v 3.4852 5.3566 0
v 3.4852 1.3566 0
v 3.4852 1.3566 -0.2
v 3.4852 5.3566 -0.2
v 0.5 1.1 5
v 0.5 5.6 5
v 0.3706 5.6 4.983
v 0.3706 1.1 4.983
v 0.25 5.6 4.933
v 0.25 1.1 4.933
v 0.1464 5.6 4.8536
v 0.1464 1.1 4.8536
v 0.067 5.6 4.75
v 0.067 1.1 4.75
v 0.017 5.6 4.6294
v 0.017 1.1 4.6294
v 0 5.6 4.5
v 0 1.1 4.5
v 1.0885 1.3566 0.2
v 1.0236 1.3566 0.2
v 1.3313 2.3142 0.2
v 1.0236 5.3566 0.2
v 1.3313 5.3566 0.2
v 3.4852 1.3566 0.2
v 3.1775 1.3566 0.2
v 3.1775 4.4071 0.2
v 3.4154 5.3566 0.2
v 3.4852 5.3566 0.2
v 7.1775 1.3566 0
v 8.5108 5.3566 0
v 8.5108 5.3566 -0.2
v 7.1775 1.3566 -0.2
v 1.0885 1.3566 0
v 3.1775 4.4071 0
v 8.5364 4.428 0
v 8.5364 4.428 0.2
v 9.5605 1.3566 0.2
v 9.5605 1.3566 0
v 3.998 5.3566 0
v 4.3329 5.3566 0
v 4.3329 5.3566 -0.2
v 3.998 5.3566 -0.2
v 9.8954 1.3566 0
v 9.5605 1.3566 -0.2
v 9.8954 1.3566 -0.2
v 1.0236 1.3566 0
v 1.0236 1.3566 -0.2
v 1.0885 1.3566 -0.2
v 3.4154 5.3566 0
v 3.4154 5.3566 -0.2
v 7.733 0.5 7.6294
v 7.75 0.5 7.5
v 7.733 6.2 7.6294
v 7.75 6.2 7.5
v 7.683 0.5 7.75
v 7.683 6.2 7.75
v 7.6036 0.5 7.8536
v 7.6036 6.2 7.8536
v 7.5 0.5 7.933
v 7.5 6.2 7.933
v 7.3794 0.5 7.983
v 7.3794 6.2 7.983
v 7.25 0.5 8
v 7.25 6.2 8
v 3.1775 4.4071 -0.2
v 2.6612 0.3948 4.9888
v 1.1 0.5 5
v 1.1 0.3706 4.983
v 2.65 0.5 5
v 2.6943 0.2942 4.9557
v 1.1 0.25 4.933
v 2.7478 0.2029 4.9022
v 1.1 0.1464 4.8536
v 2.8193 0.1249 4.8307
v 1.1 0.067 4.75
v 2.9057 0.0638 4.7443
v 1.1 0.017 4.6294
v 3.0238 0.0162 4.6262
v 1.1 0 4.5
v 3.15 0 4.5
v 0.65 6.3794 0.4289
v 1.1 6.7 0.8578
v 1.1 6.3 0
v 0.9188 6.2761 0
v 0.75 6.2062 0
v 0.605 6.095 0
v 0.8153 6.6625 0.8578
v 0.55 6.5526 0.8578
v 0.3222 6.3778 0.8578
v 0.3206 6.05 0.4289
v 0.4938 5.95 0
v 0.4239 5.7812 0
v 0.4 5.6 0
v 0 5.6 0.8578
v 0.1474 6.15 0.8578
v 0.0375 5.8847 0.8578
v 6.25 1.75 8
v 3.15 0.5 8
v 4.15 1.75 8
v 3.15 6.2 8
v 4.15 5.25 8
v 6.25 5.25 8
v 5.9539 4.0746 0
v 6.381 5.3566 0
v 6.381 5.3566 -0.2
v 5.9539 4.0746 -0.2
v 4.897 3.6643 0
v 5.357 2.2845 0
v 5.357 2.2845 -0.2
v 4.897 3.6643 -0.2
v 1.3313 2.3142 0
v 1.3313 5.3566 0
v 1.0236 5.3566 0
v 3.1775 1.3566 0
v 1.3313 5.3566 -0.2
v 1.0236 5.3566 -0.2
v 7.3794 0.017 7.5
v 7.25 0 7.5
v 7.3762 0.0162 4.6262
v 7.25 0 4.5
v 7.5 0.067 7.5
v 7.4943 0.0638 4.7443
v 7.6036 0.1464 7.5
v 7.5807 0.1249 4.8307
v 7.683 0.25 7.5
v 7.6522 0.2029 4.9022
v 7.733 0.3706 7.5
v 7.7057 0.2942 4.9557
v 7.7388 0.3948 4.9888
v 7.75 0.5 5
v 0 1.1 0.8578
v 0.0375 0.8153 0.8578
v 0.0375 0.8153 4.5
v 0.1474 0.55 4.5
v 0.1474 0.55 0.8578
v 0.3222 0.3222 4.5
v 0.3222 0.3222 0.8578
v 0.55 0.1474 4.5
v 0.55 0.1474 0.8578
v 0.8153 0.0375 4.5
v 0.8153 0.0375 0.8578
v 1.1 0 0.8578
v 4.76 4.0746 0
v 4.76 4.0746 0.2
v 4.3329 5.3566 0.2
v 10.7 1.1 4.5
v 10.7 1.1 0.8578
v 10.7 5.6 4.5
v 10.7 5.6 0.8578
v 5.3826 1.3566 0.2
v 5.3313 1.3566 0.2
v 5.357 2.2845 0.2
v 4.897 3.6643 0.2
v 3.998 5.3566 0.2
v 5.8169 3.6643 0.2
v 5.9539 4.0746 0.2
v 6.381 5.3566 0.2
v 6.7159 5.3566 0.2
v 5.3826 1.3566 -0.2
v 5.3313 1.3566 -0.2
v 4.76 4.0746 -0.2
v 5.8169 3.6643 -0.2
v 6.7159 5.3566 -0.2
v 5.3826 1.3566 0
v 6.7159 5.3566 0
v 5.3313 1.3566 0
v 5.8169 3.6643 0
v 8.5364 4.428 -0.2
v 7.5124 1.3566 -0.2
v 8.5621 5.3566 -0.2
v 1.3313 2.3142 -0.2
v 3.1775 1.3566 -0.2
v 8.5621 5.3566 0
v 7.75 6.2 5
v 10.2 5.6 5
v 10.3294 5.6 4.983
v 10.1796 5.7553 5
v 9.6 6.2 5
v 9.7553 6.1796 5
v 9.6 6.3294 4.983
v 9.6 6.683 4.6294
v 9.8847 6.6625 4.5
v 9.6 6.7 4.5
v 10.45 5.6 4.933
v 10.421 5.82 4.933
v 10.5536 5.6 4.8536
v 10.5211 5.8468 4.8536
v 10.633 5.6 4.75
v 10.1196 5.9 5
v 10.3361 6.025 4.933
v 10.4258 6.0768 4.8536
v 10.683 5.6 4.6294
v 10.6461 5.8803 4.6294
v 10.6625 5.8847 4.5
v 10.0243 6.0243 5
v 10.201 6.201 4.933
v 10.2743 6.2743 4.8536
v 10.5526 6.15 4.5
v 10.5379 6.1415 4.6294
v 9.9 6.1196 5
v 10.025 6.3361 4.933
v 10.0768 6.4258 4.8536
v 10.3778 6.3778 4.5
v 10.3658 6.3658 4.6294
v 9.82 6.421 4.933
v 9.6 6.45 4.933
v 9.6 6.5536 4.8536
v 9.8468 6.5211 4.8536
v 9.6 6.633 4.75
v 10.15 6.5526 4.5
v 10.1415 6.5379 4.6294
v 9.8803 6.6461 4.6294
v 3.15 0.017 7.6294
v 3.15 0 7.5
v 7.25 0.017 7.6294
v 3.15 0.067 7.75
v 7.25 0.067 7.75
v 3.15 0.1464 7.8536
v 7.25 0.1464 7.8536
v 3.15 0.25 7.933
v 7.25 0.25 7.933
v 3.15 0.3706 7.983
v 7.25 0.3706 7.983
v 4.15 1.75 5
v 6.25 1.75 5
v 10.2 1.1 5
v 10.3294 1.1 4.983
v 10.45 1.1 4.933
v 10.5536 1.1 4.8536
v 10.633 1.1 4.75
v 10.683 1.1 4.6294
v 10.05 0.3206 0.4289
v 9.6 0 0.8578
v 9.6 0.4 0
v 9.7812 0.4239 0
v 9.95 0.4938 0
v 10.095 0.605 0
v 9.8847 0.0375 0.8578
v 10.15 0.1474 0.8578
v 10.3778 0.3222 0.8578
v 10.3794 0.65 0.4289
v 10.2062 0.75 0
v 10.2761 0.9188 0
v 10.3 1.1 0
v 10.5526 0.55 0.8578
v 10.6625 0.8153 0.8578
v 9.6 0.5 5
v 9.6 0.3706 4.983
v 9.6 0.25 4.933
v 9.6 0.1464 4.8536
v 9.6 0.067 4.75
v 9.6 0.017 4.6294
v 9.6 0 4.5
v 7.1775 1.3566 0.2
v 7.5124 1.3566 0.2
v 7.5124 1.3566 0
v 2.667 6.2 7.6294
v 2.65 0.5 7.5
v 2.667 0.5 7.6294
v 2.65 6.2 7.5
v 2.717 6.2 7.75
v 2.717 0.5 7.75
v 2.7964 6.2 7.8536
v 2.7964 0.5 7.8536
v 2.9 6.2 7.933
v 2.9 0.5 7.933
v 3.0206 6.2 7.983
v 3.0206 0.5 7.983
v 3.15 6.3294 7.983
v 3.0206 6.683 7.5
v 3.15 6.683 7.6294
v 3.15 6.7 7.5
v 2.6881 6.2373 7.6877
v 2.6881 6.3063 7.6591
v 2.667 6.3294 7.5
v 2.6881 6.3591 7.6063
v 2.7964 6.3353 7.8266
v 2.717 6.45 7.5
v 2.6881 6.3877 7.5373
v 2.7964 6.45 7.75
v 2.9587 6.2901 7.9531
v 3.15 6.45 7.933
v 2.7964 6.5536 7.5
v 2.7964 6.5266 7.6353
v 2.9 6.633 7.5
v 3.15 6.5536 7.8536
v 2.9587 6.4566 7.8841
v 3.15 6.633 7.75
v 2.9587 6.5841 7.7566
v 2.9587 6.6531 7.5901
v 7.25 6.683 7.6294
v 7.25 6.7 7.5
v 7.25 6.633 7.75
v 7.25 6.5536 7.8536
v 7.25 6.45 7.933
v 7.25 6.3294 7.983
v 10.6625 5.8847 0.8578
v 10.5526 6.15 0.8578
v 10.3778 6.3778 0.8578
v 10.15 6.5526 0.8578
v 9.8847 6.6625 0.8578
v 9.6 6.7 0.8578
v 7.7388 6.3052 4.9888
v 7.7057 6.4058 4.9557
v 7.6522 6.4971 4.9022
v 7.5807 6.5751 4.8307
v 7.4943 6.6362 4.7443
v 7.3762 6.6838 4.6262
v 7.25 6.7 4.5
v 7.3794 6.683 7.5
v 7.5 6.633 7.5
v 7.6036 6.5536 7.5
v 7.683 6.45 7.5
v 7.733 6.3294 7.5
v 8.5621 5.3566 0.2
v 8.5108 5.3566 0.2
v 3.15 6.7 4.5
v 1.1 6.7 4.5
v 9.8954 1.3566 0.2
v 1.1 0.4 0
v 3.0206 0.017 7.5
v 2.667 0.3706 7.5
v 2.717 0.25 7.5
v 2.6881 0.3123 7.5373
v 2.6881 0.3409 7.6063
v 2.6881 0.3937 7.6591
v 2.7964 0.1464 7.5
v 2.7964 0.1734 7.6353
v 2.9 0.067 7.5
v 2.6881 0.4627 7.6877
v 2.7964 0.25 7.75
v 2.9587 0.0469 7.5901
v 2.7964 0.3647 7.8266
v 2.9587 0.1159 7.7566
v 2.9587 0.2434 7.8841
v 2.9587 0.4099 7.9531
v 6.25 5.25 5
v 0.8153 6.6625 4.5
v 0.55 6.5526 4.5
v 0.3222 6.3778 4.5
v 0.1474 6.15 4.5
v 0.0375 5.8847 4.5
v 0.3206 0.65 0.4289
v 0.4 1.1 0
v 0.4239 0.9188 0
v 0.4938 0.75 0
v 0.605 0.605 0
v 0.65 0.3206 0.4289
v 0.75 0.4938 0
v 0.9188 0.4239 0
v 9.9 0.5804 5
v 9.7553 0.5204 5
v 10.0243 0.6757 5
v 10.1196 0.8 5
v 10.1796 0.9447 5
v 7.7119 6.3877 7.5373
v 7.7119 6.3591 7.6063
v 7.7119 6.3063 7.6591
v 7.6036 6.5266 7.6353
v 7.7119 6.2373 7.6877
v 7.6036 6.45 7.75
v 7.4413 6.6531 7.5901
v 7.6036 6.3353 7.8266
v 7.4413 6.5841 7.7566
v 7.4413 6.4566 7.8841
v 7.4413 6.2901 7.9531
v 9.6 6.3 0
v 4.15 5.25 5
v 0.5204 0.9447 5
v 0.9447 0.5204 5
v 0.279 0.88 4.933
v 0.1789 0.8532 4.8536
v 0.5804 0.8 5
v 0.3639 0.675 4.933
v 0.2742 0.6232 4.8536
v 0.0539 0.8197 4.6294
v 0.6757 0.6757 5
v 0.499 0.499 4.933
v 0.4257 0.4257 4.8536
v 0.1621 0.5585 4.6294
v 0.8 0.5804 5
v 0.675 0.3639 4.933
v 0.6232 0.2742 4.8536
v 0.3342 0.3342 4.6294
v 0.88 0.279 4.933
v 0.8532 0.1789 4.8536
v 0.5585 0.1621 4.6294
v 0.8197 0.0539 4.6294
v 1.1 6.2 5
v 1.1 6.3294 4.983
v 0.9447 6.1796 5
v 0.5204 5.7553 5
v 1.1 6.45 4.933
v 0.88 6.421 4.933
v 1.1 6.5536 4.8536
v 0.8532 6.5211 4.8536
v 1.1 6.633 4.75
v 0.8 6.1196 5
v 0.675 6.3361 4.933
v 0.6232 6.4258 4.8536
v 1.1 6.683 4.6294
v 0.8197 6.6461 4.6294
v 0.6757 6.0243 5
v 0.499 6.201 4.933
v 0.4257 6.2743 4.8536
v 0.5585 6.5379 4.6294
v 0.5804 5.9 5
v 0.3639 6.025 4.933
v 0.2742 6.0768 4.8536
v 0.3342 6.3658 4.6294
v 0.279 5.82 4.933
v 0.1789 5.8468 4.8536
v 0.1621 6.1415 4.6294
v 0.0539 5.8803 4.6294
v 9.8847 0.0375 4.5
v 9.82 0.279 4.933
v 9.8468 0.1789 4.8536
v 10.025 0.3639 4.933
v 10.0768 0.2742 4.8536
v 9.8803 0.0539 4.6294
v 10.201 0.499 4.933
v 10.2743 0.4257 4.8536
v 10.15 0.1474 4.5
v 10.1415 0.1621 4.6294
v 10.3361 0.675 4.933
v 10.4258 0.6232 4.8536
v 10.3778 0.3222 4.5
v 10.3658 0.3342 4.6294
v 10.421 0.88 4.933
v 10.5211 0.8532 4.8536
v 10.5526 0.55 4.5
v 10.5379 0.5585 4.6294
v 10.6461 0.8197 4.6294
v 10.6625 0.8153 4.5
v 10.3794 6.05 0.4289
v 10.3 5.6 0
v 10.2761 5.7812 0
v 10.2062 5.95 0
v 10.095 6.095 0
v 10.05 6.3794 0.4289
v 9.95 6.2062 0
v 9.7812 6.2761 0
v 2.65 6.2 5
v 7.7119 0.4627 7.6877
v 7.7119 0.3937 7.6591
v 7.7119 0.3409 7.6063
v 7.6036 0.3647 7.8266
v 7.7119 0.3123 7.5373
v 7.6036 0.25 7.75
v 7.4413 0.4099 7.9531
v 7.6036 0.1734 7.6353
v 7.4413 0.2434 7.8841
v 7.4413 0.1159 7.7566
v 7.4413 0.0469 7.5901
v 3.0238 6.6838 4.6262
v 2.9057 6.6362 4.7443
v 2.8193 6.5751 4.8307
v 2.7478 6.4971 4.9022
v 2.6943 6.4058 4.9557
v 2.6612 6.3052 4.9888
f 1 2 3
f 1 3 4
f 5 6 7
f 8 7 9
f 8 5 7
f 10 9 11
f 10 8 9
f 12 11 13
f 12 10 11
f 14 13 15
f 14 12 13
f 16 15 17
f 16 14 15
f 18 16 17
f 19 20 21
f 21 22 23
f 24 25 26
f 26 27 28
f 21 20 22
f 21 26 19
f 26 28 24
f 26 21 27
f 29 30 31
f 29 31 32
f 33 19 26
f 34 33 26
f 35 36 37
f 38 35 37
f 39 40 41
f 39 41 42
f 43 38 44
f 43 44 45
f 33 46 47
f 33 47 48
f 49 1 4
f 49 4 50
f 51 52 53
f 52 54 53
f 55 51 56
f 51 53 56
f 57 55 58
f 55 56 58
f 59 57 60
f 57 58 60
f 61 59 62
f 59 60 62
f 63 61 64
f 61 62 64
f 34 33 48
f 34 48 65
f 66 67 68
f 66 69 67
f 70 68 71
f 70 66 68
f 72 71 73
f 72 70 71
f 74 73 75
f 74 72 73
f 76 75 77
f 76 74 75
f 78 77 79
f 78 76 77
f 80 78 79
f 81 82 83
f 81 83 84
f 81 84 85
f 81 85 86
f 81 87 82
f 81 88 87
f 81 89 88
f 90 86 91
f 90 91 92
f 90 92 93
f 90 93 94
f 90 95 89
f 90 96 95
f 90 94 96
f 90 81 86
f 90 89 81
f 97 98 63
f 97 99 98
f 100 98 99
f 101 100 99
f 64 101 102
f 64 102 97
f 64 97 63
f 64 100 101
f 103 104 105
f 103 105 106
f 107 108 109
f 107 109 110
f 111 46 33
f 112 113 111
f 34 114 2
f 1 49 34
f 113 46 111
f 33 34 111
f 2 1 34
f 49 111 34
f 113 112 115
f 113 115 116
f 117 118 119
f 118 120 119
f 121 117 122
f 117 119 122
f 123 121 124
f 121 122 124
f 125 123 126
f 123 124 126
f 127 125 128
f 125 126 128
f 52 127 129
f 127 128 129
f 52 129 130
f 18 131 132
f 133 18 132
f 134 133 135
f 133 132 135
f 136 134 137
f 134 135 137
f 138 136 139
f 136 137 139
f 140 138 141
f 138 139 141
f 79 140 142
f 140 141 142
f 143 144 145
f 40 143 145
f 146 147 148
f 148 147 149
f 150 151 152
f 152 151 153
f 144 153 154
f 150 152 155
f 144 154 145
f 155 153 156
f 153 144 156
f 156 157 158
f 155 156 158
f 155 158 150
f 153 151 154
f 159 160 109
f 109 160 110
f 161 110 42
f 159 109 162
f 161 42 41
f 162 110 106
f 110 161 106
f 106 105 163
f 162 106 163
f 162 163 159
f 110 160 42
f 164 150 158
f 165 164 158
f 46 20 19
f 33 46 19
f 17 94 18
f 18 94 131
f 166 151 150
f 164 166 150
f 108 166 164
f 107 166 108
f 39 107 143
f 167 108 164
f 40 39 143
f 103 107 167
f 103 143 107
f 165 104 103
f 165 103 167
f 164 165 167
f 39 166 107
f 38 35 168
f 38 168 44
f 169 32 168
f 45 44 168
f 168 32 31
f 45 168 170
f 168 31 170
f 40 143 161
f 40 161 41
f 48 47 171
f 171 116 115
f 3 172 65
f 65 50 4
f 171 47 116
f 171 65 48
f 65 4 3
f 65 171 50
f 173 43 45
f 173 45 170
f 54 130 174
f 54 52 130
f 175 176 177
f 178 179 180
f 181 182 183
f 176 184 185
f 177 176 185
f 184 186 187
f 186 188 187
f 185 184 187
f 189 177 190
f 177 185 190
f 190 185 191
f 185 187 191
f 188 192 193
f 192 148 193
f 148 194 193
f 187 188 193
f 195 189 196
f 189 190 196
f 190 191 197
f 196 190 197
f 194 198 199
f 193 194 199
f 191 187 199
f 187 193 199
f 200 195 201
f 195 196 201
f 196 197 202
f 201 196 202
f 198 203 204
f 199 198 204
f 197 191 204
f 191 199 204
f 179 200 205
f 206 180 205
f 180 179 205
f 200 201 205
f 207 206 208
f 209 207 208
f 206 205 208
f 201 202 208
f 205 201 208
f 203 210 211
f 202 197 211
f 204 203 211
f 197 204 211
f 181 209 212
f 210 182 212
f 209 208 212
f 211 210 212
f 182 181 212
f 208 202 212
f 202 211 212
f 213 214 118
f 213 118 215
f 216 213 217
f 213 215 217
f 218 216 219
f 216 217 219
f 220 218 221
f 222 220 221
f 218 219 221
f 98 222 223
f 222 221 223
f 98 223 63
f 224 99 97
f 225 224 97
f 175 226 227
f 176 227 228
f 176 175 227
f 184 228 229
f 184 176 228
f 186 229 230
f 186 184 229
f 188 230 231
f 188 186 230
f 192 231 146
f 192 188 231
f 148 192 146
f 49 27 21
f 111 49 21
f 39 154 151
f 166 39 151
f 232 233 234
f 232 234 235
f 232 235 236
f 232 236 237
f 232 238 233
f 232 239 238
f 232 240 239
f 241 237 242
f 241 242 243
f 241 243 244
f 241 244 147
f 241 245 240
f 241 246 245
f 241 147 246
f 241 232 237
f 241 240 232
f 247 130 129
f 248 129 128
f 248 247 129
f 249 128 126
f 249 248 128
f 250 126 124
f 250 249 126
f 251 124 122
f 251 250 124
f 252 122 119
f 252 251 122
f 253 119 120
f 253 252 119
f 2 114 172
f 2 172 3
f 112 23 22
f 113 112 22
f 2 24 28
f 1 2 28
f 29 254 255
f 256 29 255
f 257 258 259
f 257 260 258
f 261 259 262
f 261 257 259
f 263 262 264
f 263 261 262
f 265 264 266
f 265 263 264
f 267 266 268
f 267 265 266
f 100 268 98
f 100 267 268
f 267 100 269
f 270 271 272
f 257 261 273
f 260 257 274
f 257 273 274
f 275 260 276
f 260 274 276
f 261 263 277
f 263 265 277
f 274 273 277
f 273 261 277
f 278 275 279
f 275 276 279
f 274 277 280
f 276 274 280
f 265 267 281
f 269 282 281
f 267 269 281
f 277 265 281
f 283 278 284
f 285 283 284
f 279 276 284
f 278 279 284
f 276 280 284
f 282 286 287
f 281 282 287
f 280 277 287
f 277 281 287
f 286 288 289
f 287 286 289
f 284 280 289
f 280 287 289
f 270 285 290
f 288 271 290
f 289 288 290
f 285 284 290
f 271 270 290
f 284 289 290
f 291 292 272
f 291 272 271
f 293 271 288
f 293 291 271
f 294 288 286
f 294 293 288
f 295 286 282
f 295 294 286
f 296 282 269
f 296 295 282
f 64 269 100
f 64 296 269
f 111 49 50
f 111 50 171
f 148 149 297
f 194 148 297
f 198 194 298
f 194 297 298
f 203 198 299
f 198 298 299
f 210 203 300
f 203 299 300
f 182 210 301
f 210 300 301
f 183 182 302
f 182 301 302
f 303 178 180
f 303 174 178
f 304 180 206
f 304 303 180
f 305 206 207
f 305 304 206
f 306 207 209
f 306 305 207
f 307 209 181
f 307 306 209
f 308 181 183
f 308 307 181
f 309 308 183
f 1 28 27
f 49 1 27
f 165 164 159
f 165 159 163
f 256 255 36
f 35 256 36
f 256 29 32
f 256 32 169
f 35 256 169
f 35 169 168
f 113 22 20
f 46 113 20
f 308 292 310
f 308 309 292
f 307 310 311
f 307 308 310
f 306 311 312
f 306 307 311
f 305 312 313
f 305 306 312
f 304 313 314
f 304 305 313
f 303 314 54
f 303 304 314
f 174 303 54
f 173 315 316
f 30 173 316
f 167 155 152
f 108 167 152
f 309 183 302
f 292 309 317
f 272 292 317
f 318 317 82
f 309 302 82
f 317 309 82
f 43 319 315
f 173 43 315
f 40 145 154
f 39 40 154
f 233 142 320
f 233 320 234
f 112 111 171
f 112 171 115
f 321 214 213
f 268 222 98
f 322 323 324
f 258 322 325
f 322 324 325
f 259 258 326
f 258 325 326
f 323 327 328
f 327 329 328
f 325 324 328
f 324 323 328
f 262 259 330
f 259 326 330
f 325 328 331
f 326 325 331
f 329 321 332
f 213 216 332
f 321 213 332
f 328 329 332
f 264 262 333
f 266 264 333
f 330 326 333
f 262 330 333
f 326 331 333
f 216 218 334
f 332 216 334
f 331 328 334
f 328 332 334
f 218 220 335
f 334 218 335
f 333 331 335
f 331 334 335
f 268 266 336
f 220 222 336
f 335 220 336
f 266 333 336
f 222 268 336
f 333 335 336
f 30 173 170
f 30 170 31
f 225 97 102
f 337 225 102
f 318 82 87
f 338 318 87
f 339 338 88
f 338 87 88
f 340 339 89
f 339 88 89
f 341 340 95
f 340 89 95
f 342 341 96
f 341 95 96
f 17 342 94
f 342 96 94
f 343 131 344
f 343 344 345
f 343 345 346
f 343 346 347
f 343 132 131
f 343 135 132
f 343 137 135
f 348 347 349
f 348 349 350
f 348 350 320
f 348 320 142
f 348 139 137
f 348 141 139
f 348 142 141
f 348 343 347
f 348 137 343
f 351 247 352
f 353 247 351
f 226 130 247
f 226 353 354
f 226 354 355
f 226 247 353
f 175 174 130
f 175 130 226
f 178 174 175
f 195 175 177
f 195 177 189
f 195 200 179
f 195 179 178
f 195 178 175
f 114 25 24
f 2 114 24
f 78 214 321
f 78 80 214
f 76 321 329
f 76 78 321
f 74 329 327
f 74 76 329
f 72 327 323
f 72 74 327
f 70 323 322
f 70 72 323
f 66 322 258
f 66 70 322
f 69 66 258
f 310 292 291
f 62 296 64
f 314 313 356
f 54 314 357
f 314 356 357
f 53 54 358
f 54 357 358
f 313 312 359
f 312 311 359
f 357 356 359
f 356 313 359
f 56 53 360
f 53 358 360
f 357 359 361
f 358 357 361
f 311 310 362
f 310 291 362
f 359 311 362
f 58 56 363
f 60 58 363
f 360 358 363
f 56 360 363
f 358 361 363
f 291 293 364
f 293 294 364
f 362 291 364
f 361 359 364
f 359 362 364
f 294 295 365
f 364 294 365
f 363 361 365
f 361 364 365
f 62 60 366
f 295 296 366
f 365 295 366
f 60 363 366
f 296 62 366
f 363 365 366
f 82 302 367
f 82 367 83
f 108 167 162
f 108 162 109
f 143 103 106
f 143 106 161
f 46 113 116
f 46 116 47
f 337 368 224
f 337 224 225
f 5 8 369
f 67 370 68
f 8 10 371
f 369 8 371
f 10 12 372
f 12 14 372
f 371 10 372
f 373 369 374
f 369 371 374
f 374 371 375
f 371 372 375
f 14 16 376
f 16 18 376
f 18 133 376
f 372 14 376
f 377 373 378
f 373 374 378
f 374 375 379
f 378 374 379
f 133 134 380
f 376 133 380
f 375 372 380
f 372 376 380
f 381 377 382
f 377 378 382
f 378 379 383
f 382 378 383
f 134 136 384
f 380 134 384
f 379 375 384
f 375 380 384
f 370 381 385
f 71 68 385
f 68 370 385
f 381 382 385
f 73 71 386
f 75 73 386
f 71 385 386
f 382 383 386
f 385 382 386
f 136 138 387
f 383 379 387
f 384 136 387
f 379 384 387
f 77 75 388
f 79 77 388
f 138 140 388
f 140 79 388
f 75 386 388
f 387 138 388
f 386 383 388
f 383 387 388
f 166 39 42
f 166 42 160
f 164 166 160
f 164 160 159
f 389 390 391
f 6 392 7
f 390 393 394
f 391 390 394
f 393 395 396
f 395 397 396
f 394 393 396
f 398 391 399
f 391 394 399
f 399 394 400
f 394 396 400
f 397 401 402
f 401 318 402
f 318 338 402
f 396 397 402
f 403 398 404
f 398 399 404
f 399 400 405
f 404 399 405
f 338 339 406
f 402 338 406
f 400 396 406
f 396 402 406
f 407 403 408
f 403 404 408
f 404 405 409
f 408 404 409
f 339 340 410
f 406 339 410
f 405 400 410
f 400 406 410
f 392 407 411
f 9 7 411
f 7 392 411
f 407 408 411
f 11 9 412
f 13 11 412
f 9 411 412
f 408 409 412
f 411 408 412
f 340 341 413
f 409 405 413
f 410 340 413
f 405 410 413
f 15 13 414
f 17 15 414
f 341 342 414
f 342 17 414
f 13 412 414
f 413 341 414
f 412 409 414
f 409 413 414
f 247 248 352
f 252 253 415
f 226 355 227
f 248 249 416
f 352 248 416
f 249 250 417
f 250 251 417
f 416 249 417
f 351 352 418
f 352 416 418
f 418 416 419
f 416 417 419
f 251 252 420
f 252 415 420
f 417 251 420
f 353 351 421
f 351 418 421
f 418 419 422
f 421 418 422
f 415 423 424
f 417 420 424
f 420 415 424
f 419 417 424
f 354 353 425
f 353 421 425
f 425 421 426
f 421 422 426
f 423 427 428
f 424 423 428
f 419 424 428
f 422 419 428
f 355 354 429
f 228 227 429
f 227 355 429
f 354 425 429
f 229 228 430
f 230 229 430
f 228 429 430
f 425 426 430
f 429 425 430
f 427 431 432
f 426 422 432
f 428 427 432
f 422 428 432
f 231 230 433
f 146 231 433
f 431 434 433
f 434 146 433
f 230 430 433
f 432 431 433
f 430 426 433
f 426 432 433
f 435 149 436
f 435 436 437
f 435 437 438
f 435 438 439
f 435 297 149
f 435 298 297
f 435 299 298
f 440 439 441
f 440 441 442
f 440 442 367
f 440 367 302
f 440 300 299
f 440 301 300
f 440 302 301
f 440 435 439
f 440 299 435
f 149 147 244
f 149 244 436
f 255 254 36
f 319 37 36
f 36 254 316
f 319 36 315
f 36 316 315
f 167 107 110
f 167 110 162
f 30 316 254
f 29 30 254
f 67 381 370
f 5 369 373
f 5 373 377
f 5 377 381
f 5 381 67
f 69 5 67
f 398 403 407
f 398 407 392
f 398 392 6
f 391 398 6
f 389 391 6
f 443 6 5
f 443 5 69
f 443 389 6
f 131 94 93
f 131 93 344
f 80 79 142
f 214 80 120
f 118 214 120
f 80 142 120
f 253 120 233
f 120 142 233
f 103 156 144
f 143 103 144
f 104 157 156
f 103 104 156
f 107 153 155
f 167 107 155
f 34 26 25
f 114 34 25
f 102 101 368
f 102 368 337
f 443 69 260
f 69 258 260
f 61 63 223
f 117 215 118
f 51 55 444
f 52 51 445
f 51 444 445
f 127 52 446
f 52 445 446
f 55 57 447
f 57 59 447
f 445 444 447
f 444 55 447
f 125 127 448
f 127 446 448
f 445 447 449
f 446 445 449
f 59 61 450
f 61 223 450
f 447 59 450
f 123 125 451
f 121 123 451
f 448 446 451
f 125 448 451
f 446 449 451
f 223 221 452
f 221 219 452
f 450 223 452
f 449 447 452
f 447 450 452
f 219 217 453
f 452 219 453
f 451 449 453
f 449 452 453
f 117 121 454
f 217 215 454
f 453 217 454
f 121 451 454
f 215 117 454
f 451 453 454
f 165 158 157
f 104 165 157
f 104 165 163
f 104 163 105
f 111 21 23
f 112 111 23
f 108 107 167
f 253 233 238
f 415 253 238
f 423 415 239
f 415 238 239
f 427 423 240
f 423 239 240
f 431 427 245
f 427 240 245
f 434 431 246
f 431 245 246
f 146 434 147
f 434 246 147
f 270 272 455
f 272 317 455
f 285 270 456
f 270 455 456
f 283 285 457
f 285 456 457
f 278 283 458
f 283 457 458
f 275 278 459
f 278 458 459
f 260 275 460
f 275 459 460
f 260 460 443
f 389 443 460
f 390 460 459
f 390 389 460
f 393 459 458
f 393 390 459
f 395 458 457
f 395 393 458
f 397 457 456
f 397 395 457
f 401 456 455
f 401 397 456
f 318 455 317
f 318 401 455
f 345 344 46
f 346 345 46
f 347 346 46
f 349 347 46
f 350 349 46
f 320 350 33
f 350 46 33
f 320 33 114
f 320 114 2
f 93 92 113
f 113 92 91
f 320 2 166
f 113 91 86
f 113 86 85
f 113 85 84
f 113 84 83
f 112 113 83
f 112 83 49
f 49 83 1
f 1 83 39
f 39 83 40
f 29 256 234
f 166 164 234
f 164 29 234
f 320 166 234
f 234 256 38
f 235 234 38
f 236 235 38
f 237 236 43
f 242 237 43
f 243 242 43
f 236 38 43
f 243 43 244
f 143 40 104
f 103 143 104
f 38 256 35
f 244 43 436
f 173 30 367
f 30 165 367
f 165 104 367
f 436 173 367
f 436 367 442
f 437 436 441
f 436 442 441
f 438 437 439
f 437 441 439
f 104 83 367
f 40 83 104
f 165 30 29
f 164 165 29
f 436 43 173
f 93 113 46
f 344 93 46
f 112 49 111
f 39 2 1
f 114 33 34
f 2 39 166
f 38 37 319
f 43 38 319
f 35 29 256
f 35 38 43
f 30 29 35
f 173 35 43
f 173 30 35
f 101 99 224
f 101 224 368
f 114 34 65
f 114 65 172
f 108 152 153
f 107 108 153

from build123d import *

# Parameters (mm, degrees)
BOSS_EXTRU_1_DEPTH      = 8
ESQUISSE3_W             = 2.1
ESQUISSE3_H             = 3.5
ENL_V_MAT_EXTRU_1_DEPTH = 3
ESQUISSE4_OUTSIDE_W     = 15.69
ESQUISSE4_OUTSIDE_H     = 11.69
ESQUISSE4_OUTSIDE_W_2   = 5.1
ESQUISSE4_OUTSIDE_H_2   = 6.7
ENL_V_MAT_EXTRU_2_DEPTH = 3
CONG_1_R                = 0.5
CHANFREIN1_SIZE         = 0.4
CHANFREIN1_SIZE2        = 0.857802768
ENL_V_MAT_EXTRU_3_DEPTH = 0.3
BOSS_EXTRU_2_START      = -0.2
BOSS_EXTRU_2_DEPTH      = 0.2
BOSS_EXTRU_2_2_DEPTH    = 0.2
BOSS_EXTRU_2_3_DEPTH    = 0.2


with BuildPart() as part:
    # Esquisse2 → Boss.-Extru.1 (new body)
    with BuildSketch(Plane.XY):
        with BuildLine():
            Line((1.1, 0), (9.6, 0))
            ThreePointArc((9.6, 0), (10.377817459, 0.322182541), (10.7, 1.1))
            Line((10.7, 1.1), (10.7, 5.6))
            ThreePointArc((10.7, 5.6), (10.377817459, 6.377817459), (9.6, 6.7))
            Line((9.6, 6.7), (1.1, 6.7))
            ThreePointArc((1.1, 6.7), (0.322182541, 6.377817459), (0, 5.6))
            Line((0, 5.6), (0, 1.1))
            ThreePointArc((0, 1.1), (0.322182541, 0.322182541), (1.1, 0))
        make_face()
    extrude(amount=BOSS_EXTRU_1_DEPTH)

    # Esquisse3 → Enlèv. mat.-Extru.1 (cut)
    with BuildSketch(Plane.XY.offset(8)):
        with Locations((5.2, 3.5)):
            Rectangle(ESQUISSE3_W, ESQUISSE3_H)
    extrude(amount=-ENL_V_MAT_EXTRU_1_DEPTH, mode=Mode.SUBTRACT)

    # Esquisse4 outside → Enlèv. mat.-Extru.2 (cut)
    with BuildSketch(Plane.XY.offset(8)):
        with Locations((5.35, 3.35)):
            Rectangle(ESQUISSE4_OUTSIDE_W, ESQUISSE4_OUTSIDE_H)
        with Locations((5.2, 3.35)):
            Rectangle(ESQUISSE4_OUTSIDE_W_2, ESQUISSE4_OUTSIDE_H_2, mode=Mode.SUBTRACT)
    extrude(amount=-ENL_V_MAT_EXTRU_2_DEPTH, mode=Mode.SUBTRACT)

    # Congé1
    cong_1_edges = [part.edges().sort_by_distance(p)[0] for p in [
        (5.2, 6.7, 8),
        (5.2, 0, 8),
        (10.7, 3.35, 5),
        (1.875, 6.7, 5),
        (0.322182541, 6.377817459, 5),
        (0, 3.35, 5),
        (0.322182541, 0.322182541, 5),
        (1.875, 0, 5),
        (8.675, 0, 5),
        (10.377817459, 0.322182541, 5),
        (10.377817459, 6.377817459, 5),
        (8.675, 6.7, 5),
        (7.75, 6.7, 6.5),
        (7.75, 3.35, 8),
        (7.75, 0, 6.5),
        (2.65, 0, 6.5),
        (2.65, 3.35, 8),
        (2.65, 6.7, 6.5),
    ]]
    fillet(cong_1_edges, radius=CONG_1_R)

    # Chanfrein1
    chanfrein1_edges = [part.edges().sort_by_distance(p)[0] for p in [
        (5.35, 6.7, 0),
        (10.377817459, 6.377817459, 0),
        (10.7, 3.35, 0),
        (10.377817459, 0.322182541, 0),
        (5.35, 0, 0),
        (0.322182541, 0.322182541, 0),
        (0, 3.35, 0),
        (0.322182541, 6.377817459, 0),
    ]]
    chanfrein1_side = [part.faces().sort_by_distance(p)[0] for p in [
        (5.35, 3.35, 0),
    ]]
    chamfer(chanfrein1_edges, length=CHANFREIN1_SIZE, length2=CHANFREIN1_SIZE2, reference=chanfrein1_side[0])

    # Esquisse5 → Enlèv. mat.-Extru.3 (cut)
    # profile 1 of 3: a face of its own
    with BuildSketch(Plane.XY.offset(0.2)):
        Polygon((1.023618725, 5.356639893), (1.023618725, 1.356639893), (1.088522571, 1.356639893), (3.177464879, 4.407120662), (3.177464879, 1.356639893), (3.485157187, 1.356639893), (3.485157187, 5.356639893), (3.415445648, 5.356639893), (1.331311033, 2.314171944), (1.331311033, 5.356639893), align=None)
    # profile 2 of 3: a face of its own
    with BuildSketch(Plane.XY.offset(0.2)):
        Polygon((5.382593084, 1.356639893), (6.715926417, 5.356639893), (6.38099052, 5.356639893), (5.953907187, 4.074588611), (4.75999693, 4.074588611), (4.332913597, 5.356639893), (3.997977699, 5.356639893), (5.331311033, 1.356639893), align=None)
        Polygon((5.356952058, 2.284524508), (4.897016161, 3.6643322), (5.816887956, 3.6643322), align=None, mode=Mode.SUBTRACT)
    # profile 3 of 3: a face of its own
    with BuildSketch(Plane.XY.offset(0.2)):
        Polygon((7.177464879, 1.356639893), (7.512400776, 1.356639893), (8.536439238, 4.427953995), (9.560477699, 1.356639893), (9.895413597, 1.356639893), (8.562080264, 5.356639893), (8.510798212, 5.356639893), align=None)
    extrude(amount=-ENL_V_MAT_EXTRU_3_DEPTH, mode=Mode.SUBTRACT)


with BuildPart() as body_2:
    # Esquisse5<3> → Boss.-Extru.2 (new body)
    with BuildSketch(Plane.XY.offset(0.2).offset(BOSS_EXTRU_2_START)):
        Polygon((1.023618725, 5.356639893), (1.023618725, 1.356639893), (1.088522571, 1.356639893), (3.177464879, 4.407120662), (3.177464879, 1.356639893), (3.485157187, 1.356639893), (3.485157187, 5.356639893), (3.415445648, 5.356639893), (1.331311033, 2.314171944), (1.331311033, 5.356639893), align=None)
    extrude(amount=-BOSS_EXTRU_2_DEPTH)


with BuildPart() as body_3:
    # Esquisse5<3> → Boss.-Extru.2 2 (new body)
    with BuildSketch(Plane.XY.offset(0.2).offset(BOSS_EXTRU_2_START)):
        Polygon((5.382593084, 1.356639893), (6.715926417, 5.356639893), (6.38099052, 5.356639893), (5.953907187, 4.074588611), (4.75999693, 4.074588611), (4.332913597, 5.356639893), (3.997977699, 5.356639893), (5.331311033, 1.356639893), align=None)
        Polygon((5.356952058, 2.284524508), (4.897016161, 3.6643322), (5.816887956, 3.6643322), align=None, mode=Mode.SUBTRACT)
    extrude(amount=-BOSS_EXTRU_2_2_DEPTH)


with BuildPart() as body_4:
    # Esquisse5<3> → Boss.-Extru.2 3 (new body)
    with BuildSketch(Plane.XY.offset(0.2).offset(BOSS_EXTRU_2_START)):
        Polygon((7.177464879, 1.356639893), (7.512400776, 1.356639893), (8.536439238, 4.427953995), (9.560477699, 1.356639893), (9.895413597, 1.356639893), (8.562080264, 5.356639893), (8.510798212, 5.356639893), align=None)
    extrude(amount=-BOSS_EXTRU_2_3_DEPTH)


solid = Compound([part.part, body_2.part, body_3.part, body_4.part])
